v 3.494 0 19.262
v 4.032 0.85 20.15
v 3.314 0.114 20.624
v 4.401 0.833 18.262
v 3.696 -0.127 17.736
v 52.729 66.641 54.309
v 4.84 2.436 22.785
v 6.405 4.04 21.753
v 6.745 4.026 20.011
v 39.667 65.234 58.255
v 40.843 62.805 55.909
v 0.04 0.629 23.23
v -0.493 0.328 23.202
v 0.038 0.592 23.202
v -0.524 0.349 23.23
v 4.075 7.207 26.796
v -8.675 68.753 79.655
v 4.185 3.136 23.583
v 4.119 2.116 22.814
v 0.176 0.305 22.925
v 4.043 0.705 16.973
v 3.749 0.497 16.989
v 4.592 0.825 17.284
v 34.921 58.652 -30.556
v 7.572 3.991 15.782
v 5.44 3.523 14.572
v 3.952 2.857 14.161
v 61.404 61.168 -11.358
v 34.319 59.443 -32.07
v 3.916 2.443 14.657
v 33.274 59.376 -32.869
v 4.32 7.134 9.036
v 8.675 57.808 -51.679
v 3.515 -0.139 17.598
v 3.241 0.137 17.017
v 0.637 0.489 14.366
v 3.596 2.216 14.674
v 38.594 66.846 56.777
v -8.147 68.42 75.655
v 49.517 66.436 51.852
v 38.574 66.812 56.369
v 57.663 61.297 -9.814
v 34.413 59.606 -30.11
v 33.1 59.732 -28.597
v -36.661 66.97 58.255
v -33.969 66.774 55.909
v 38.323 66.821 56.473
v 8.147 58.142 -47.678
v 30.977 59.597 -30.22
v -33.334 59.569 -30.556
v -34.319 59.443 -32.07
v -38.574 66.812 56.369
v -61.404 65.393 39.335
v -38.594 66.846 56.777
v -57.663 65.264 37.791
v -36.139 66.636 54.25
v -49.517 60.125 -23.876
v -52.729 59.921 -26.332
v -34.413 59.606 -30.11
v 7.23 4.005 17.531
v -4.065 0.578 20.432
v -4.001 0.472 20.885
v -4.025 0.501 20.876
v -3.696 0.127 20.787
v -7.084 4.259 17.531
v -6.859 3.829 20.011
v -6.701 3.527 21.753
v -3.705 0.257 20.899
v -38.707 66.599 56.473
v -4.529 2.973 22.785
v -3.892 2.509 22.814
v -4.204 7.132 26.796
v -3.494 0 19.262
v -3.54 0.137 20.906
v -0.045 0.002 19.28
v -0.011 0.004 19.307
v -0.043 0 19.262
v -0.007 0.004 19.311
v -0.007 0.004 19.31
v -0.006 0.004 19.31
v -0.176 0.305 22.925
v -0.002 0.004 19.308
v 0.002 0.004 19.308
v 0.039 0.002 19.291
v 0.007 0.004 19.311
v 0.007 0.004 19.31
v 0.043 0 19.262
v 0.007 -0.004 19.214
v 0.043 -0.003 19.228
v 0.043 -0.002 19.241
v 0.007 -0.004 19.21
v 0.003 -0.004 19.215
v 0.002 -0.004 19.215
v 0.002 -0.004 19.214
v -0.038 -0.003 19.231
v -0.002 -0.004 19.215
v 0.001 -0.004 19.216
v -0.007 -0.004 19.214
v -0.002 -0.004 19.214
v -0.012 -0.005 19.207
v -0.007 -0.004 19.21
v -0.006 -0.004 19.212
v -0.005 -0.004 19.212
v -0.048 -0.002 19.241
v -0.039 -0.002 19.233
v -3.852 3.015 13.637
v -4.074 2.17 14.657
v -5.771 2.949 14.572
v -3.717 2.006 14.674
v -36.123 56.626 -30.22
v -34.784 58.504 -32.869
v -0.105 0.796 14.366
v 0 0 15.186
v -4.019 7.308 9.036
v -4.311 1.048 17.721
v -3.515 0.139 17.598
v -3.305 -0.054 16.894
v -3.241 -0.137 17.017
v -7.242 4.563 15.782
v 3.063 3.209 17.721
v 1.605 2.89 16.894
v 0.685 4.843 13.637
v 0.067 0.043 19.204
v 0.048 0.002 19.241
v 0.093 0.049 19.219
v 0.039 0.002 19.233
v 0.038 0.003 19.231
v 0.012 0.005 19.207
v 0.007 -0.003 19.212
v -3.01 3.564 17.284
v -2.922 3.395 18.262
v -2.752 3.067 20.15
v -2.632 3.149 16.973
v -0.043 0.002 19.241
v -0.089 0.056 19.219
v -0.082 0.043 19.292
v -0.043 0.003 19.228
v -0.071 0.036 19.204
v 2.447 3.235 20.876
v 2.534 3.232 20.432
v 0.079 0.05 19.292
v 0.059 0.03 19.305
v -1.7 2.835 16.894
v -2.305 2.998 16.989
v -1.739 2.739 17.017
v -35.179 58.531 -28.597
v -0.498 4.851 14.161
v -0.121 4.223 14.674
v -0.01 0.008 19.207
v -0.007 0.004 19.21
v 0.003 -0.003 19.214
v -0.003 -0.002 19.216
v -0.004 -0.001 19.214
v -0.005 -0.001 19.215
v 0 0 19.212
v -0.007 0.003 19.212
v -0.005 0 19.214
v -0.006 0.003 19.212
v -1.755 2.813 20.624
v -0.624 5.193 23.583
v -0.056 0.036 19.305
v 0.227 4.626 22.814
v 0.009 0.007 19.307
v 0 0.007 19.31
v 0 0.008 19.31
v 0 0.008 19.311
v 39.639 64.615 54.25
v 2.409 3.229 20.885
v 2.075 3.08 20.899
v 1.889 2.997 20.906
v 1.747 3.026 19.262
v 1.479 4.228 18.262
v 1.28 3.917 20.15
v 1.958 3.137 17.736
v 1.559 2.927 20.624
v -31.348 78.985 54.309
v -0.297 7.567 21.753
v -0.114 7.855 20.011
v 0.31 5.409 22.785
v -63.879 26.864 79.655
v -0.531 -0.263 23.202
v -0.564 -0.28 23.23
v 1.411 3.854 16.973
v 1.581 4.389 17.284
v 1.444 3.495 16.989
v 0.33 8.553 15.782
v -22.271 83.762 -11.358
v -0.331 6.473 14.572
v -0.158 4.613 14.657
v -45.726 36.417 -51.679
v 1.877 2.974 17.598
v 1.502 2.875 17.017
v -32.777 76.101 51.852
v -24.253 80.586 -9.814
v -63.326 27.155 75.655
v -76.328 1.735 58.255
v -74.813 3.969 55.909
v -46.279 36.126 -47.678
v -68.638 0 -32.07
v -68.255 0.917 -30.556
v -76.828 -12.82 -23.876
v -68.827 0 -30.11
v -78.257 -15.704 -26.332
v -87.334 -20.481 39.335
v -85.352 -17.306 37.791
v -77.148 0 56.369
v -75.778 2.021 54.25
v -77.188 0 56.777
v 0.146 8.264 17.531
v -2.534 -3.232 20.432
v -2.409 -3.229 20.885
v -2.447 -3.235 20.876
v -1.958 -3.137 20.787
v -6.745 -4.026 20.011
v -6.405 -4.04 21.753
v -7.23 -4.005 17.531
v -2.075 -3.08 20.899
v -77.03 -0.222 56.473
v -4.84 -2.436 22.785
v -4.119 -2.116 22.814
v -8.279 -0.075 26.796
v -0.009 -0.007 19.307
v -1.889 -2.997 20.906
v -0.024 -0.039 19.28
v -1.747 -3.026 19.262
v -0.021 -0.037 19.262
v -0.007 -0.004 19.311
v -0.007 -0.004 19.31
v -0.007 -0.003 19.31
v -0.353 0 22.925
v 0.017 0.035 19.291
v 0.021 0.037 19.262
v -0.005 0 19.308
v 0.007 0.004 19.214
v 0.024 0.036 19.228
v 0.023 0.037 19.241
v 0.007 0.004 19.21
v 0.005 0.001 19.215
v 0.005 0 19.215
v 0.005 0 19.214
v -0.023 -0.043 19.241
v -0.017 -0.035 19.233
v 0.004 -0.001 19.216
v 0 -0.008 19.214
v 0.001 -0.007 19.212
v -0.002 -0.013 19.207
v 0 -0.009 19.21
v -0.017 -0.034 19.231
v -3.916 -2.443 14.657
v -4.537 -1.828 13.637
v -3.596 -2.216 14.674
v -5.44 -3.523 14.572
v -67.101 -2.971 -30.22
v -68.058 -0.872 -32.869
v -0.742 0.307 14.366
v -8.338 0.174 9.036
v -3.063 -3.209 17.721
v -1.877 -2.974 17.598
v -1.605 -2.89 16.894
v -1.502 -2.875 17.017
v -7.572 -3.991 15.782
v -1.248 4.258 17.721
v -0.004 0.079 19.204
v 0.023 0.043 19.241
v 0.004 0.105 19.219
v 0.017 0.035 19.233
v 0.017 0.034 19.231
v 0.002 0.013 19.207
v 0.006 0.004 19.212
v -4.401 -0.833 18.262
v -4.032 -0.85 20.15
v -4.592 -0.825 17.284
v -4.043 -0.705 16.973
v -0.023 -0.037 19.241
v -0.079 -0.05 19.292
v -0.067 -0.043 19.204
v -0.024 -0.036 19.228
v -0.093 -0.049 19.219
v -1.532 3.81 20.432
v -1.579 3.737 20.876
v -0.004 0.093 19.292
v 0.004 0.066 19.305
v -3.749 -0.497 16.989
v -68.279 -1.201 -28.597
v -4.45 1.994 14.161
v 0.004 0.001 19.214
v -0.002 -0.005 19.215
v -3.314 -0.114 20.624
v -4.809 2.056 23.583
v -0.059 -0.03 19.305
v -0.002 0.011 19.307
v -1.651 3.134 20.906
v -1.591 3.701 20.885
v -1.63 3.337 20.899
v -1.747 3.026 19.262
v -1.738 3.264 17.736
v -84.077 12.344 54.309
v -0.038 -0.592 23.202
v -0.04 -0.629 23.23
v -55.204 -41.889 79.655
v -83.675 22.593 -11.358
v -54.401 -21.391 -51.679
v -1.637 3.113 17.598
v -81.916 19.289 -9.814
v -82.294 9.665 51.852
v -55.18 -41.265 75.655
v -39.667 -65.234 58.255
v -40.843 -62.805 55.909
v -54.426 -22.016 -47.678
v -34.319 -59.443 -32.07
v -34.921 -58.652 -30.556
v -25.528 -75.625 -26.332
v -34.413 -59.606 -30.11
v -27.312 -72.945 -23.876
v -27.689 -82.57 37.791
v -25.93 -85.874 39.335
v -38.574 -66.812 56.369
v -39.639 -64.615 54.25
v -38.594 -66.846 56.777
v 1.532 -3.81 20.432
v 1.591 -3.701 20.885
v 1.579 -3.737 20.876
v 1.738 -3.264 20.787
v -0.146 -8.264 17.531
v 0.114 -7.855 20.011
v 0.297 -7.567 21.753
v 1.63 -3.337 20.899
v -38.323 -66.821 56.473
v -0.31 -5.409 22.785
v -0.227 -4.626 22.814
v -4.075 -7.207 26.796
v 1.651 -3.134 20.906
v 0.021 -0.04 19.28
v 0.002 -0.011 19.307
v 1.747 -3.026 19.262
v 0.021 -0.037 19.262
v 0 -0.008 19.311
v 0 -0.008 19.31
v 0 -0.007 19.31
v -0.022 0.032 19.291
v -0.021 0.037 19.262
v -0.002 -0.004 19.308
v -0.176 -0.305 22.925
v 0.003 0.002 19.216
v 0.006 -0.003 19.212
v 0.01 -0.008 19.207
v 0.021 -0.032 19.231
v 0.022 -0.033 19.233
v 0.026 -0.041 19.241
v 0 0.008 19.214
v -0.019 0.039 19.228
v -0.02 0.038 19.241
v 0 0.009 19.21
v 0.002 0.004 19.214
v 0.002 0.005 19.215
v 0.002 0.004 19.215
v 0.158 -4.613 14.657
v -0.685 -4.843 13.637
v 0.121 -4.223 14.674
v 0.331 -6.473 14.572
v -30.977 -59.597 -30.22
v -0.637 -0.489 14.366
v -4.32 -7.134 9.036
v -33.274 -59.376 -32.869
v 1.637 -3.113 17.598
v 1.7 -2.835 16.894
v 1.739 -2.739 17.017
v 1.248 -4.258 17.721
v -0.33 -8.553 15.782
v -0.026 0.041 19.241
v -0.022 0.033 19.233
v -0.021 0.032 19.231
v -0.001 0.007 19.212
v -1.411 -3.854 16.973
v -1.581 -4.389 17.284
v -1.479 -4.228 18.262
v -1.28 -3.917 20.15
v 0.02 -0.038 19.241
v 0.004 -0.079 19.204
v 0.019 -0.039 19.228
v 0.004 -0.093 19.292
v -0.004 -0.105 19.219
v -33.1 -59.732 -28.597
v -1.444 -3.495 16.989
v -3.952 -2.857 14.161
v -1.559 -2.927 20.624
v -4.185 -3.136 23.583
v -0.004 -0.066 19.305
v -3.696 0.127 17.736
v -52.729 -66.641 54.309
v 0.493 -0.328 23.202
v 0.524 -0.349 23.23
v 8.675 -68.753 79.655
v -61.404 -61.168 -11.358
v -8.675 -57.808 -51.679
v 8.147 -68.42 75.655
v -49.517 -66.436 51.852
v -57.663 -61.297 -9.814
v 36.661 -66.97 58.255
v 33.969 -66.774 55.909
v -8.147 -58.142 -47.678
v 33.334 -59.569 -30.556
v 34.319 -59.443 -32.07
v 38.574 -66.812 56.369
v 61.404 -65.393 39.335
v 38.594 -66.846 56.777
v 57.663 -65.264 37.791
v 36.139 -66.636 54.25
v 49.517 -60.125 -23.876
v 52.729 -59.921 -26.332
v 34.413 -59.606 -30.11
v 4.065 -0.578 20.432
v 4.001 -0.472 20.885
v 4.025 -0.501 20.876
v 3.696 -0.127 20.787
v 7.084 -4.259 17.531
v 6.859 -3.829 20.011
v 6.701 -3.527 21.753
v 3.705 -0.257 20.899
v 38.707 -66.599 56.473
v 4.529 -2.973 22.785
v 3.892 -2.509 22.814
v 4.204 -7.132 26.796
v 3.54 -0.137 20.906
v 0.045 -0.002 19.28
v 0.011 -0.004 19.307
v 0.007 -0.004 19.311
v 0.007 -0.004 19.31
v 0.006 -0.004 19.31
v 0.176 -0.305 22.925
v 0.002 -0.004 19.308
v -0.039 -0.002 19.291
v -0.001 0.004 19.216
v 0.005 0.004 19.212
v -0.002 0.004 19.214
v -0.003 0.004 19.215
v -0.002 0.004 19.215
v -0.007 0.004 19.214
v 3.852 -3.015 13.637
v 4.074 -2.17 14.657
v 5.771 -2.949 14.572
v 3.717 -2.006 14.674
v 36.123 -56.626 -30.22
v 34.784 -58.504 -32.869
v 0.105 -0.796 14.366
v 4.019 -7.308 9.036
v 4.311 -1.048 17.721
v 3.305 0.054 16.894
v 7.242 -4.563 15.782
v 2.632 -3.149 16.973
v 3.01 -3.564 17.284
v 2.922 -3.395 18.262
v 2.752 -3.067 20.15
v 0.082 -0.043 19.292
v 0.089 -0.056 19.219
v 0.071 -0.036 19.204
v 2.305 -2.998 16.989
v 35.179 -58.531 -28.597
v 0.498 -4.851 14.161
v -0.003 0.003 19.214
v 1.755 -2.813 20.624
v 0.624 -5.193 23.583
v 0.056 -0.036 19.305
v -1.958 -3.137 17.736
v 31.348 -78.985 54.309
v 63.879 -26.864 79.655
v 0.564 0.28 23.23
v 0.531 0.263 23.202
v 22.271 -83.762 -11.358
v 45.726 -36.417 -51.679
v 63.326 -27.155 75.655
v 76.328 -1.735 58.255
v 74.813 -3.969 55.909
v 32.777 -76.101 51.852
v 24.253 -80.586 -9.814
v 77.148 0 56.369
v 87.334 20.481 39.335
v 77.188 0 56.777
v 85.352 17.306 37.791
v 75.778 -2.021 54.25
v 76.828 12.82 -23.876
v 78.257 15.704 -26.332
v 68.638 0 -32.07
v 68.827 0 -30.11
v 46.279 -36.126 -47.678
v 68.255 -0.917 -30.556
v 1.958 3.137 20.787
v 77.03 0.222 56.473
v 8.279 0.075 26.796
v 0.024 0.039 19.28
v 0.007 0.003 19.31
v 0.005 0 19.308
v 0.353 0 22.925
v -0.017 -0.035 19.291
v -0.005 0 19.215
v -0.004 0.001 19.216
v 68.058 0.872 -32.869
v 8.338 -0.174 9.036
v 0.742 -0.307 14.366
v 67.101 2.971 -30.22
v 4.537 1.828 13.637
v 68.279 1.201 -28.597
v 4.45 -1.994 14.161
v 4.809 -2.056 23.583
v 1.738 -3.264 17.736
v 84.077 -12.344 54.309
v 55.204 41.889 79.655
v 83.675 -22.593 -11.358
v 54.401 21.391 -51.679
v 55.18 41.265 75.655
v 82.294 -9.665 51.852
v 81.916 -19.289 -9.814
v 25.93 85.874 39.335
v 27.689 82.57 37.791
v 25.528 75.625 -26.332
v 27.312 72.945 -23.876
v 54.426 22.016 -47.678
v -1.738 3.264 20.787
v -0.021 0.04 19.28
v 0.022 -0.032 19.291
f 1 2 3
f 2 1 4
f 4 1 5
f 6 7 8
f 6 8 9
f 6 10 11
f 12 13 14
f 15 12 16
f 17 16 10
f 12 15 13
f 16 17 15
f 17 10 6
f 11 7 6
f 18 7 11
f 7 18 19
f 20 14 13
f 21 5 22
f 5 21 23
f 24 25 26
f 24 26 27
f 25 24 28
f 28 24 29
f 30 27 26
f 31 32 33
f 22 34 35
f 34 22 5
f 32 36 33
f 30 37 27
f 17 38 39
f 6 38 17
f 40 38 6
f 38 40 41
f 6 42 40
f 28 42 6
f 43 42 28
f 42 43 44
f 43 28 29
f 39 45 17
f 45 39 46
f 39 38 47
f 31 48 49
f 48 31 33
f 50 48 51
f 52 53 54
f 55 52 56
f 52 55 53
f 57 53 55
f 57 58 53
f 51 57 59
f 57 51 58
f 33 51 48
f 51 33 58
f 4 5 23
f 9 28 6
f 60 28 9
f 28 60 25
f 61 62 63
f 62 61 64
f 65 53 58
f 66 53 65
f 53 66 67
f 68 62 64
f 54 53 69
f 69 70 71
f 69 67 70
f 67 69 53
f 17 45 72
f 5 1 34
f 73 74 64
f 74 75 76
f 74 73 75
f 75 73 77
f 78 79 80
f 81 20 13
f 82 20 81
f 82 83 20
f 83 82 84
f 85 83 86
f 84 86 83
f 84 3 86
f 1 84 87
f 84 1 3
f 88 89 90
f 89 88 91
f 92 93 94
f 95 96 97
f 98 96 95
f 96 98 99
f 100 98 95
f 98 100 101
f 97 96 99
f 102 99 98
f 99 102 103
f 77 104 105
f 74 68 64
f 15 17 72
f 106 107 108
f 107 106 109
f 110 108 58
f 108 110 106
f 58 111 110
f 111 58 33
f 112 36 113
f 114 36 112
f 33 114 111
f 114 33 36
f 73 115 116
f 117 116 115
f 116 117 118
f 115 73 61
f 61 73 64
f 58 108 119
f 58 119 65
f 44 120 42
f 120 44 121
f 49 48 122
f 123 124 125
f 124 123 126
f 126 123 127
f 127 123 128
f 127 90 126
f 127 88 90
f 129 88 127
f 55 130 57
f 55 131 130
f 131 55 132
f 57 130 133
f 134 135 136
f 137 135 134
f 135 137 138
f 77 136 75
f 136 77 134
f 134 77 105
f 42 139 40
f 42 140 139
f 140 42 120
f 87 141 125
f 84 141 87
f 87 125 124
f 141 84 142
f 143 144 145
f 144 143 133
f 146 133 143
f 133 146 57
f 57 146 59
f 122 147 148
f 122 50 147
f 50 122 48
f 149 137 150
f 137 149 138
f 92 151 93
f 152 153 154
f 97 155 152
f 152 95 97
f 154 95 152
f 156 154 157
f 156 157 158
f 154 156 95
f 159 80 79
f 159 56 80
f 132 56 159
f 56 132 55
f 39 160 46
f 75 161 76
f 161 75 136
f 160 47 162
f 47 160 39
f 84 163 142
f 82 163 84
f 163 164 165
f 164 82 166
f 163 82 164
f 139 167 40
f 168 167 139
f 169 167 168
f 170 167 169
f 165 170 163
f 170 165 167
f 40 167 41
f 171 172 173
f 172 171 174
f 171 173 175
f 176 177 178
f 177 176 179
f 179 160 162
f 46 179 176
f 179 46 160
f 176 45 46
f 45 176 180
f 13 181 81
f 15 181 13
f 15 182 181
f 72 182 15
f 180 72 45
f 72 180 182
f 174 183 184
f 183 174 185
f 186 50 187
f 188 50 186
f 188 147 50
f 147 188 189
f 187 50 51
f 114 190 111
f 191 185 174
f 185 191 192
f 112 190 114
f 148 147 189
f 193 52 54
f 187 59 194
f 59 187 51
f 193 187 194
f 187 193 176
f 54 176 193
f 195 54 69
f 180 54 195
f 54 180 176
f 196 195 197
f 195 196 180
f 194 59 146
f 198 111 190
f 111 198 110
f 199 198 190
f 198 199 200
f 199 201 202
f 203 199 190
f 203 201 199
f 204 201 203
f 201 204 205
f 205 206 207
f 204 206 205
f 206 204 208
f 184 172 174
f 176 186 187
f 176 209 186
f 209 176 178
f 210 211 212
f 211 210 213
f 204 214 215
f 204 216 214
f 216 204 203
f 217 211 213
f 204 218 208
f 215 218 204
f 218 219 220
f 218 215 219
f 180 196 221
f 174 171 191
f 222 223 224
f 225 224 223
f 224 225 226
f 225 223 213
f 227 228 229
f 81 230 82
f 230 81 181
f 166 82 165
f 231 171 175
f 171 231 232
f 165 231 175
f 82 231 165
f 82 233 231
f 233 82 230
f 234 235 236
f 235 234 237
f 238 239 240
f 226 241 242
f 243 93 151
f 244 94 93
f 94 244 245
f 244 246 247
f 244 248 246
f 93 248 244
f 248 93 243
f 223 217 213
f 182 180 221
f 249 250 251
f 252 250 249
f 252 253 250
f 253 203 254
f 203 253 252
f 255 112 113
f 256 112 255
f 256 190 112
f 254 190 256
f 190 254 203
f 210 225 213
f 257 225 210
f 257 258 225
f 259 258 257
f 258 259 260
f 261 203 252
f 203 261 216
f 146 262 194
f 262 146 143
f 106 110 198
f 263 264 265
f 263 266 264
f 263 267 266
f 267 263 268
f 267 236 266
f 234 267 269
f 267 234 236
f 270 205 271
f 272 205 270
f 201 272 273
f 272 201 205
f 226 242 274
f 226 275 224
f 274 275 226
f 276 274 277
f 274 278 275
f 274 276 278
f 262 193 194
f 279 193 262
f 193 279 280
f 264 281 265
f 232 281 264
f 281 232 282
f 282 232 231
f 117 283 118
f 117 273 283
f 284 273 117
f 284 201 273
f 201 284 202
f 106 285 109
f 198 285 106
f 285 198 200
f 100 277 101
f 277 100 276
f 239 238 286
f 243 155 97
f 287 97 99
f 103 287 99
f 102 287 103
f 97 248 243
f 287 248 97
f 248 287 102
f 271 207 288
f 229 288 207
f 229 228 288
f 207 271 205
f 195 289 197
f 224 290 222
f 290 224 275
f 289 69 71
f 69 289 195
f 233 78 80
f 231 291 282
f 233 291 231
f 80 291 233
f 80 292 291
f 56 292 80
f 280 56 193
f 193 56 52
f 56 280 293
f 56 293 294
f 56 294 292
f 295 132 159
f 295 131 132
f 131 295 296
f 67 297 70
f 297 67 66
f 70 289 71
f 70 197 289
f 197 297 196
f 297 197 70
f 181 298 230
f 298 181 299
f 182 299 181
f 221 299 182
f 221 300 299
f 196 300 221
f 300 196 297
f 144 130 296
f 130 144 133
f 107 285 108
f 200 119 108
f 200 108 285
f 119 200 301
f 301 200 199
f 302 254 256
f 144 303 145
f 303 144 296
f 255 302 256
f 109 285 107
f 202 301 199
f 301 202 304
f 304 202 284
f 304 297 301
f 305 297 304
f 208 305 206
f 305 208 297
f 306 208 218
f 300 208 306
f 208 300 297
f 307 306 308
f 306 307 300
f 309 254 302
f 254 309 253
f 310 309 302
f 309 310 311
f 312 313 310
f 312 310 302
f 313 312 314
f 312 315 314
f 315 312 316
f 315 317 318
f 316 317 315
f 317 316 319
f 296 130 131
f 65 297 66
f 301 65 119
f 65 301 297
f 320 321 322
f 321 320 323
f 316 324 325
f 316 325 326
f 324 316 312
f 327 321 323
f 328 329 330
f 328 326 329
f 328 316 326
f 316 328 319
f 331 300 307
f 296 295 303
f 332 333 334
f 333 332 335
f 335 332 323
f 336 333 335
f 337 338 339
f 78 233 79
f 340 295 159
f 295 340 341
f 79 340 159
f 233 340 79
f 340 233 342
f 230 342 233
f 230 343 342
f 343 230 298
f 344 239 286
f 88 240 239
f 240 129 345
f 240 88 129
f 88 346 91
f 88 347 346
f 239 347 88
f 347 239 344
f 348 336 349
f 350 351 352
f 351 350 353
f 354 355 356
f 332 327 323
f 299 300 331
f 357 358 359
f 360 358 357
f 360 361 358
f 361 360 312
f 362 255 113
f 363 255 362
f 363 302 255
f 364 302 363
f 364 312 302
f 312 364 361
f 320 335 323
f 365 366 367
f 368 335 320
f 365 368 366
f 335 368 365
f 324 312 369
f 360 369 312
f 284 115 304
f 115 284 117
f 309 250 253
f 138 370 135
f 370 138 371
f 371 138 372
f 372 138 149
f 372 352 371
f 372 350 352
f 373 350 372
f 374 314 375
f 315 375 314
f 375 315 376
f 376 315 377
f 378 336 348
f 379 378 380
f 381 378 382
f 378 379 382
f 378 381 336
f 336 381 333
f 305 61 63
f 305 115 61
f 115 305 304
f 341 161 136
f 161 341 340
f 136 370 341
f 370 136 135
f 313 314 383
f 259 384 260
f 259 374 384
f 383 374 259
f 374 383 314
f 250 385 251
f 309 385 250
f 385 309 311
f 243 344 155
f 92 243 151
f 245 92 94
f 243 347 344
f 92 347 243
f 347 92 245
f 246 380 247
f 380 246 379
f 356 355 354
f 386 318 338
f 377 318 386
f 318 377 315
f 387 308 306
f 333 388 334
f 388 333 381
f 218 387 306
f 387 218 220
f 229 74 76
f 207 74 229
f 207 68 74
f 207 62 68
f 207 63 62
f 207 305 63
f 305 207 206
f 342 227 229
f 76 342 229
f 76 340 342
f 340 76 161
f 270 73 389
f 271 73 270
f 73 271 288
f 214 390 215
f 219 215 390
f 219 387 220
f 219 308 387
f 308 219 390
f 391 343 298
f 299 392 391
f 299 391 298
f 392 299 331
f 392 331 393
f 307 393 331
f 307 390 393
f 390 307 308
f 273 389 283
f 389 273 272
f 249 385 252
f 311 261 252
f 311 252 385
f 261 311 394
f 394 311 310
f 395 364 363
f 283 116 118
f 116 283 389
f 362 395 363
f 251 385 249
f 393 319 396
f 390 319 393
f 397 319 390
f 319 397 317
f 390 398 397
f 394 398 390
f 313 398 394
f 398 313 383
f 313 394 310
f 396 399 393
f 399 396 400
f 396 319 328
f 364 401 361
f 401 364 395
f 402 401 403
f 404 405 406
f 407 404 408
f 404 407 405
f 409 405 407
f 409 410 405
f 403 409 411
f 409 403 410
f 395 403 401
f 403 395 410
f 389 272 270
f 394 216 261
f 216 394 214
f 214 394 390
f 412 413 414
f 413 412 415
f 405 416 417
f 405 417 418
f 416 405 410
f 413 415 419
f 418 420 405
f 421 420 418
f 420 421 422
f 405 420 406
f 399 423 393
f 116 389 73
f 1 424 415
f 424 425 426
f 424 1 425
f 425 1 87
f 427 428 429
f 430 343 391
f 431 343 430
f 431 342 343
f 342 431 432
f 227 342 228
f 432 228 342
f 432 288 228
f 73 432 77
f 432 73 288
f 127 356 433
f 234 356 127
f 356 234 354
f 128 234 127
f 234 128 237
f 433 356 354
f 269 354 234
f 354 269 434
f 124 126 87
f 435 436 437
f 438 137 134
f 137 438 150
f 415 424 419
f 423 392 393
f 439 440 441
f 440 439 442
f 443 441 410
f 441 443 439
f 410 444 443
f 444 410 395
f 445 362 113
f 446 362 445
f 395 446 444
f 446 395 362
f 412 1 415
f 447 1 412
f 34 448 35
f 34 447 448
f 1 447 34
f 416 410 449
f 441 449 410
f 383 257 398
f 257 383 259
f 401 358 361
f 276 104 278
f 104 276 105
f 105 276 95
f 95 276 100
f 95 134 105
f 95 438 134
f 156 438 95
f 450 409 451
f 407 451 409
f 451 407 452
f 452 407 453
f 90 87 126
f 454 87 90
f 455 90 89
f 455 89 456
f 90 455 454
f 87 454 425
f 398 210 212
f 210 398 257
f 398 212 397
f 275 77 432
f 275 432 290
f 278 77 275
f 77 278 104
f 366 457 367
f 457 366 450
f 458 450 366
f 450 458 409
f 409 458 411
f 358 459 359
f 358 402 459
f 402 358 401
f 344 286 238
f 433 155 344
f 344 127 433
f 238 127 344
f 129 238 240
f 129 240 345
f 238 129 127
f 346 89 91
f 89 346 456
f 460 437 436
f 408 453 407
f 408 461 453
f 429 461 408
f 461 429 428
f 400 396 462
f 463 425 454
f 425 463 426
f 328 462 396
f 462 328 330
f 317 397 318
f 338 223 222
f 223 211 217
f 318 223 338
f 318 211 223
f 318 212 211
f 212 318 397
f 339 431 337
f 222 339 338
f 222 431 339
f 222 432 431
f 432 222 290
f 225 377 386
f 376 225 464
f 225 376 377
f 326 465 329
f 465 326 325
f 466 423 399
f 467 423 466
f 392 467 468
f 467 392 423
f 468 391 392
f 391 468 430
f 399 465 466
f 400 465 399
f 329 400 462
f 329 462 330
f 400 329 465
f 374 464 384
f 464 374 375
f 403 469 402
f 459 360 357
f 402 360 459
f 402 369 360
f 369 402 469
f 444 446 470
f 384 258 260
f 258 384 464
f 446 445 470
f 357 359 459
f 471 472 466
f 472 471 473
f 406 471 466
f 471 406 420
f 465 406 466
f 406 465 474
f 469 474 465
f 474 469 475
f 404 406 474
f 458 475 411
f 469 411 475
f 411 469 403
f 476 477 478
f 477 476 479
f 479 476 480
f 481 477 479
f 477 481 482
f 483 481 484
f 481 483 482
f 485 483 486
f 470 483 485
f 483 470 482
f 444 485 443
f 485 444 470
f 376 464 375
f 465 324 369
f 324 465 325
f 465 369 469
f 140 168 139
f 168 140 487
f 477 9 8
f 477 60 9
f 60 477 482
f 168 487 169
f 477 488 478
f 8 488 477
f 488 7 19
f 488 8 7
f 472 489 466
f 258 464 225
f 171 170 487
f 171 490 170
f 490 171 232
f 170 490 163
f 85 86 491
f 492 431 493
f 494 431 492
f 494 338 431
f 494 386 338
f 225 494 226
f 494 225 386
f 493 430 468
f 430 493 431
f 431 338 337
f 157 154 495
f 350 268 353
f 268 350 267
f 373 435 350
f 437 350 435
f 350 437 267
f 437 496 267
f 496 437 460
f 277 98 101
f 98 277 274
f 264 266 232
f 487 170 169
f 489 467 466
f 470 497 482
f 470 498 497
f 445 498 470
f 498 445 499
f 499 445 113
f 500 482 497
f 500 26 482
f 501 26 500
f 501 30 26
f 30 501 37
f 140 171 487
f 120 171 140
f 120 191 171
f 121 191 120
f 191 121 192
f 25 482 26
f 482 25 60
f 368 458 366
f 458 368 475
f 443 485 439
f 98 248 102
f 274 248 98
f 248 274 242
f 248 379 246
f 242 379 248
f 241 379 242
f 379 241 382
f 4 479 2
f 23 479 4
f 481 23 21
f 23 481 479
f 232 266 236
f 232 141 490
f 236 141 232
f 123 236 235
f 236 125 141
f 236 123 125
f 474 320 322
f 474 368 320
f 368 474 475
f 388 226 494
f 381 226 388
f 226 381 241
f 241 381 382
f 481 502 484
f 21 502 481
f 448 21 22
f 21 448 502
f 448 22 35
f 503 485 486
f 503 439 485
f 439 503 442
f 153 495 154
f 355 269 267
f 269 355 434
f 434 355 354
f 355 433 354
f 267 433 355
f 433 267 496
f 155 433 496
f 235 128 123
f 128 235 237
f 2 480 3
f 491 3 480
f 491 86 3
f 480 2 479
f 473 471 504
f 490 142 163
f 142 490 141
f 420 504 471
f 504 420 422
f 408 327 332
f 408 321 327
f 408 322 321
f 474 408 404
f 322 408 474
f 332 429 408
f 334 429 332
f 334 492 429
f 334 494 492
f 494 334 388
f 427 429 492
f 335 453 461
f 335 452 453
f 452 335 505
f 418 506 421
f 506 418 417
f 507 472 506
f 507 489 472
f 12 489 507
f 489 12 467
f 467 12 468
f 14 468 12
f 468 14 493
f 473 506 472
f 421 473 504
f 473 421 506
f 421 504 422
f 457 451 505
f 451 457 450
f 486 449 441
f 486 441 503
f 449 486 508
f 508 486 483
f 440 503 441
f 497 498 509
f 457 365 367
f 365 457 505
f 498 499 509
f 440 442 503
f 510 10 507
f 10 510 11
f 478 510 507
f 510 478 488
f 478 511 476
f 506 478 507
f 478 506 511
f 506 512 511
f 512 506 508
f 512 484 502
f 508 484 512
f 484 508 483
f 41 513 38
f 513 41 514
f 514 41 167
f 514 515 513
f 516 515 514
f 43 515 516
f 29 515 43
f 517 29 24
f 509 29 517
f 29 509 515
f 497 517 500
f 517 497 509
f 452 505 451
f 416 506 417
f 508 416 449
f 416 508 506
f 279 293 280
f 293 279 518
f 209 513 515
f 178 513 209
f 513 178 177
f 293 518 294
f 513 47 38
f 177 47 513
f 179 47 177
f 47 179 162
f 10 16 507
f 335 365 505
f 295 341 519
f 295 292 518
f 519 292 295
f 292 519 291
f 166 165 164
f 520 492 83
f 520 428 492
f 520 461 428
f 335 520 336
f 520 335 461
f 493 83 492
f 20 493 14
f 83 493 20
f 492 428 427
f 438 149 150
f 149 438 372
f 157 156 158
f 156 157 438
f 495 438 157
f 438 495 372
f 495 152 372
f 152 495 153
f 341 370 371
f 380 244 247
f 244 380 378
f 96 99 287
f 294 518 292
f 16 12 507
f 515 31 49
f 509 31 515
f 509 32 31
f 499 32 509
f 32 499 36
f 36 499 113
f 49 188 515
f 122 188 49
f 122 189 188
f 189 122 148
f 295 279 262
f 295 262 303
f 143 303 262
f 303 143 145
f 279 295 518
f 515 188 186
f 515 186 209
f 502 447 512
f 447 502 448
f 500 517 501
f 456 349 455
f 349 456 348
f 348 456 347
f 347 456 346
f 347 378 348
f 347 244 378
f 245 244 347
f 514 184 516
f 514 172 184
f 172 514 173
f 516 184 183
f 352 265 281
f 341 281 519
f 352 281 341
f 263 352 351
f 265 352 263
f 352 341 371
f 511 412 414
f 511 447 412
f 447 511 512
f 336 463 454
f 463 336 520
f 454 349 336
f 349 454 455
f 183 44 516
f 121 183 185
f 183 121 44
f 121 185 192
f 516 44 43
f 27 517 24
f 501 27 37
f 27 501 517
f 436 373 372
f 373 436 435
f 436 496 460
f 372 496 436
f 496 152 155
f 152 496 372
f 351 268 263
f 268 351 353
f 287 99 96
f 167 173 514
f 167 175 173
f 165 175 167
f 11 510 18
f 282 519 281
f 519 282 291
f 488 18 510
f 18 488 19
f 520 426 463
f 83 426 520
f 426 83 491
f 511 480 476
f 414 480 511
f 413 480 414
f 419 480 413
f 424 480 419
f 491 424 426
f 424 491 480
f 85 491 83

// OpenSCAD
//Start with Cup Dimensions - these are for a Starbucks $1 Reusable Cup
bottom_diameter=59.5;
top_diameter=82;
//Make sure the height is measured as the distance between your top and bottom radius measurements!
height=135;

//Now some basic properties of your sleeve
color="aqua"; //[black,silver,gray,white,maroon,red,purple,fuchsia,green,lime,olive,yellow,navy,blue,teal,aqua,brown,sienna]
thickness=2; //[1:4]
border=3; //[1:30]
sleeve_height_percent=95;//[10:95]
//Use this to move the sleeve up or down on the cup
sleeve_z_offset=0;

//And finally the pattern variables...
line_thickness=4;
sides=6;//[3:20]
size=18;//[1:20]
overlap=5;//[0:10]
//This is the spin of each shape about its center
spin=22.5;//[-90:90]
//This is the amount the pattern is made to "spiral" around the cup, vs. stack straight up
pattern_spin=9;//[0:10]

part=1;//[1:Render,2:Final]

////////////////////////////////

bottom_radius=bottom_diameter/2;
top_radius=top_diameter/2;
rb=bottom_diameter/2+thickness;
rt=top_diameter/2+thickness;
h=height;
lt=line_thickness;
sh=sleeve_height_percent/100*h;
szo=sleeve_z_offset;

res=30;


theta=atan((rt-rb)/h);
count=24-size;
thetac=360/count;
rpb=rb*3.14/count;
rp=rpb*(1+overlap*.2);

rows=round(h/(2*rpb));
echo(rows);
echo(count);
echo(theta);

ring();

module sleeve(){
	color(color)union(){
		intersection(){
			cupwall();
		
			translate([0,0,h/2+szo])cylinder(r=rt*2,h=sh,center=true);
		
			for(i=[0:rows]){
				rotate([0,0,thetac*i/2*pattern_spin/10])
				translate([0,0,2*rpb*i])
				ring();
			}
		}
		
		intersection(){
			cupwall();
			translate([0,0,szo+(h-sh)/2])cylinder(r=rt*2,h=border,$fn=res);
		}
		
		intersection(){
			cupwall();
			translate([0,0,h-border+szo-(h-sh)/2])cylinder(r=rt*2,h=border,$fn=res);
		}
	}
}

module cup(){
	color("white")difference(){
		union(){
			translate([0,0,-.1])cylinder(r1=bottom_radius+.1,r2=top_radius+.1,h=h+.2,$fn=res);
			translate([0,0,h+.2-2.5])cylinder(r=top_radius+1.5,h=2.5,$fn=res);
		}
		translate([0,0,6])cylinder(r1=bottom_radius-1,r2=top_radius-1,h=h+.2,$fn=res);
		translate([0,0,-.2])cylinder(r=bottom_radius-1,h=5,$fn=res);
	}
}


module ring(){
	for(i=[0:count-1]) {
        rotate([0,0,i*thetac]) {
            translate([0,0,rb*tan(theta)+rpb])
                rotate([-90-theta,0,0])
                    rotate([0,0,spin])
                        difference() {
                            cylinder(r1=lt,r2=2*rp,h=2*rb,$fn=sides);
                            translate([0,0,-.05])cylinder(r1=0,r2=2*rp-lt,h=2*rb+.1,$fn=sides);
                        }
        }
    }
}

module cupwall(){
	difference(){
		cylinder(r1=rb,r2=rt,h=h,$fn=30);
		translate([0,0,-.05])cylinder(r1=bottom_radius,r2=top_radius,h=h+.1,$fn=res);
	}
}
